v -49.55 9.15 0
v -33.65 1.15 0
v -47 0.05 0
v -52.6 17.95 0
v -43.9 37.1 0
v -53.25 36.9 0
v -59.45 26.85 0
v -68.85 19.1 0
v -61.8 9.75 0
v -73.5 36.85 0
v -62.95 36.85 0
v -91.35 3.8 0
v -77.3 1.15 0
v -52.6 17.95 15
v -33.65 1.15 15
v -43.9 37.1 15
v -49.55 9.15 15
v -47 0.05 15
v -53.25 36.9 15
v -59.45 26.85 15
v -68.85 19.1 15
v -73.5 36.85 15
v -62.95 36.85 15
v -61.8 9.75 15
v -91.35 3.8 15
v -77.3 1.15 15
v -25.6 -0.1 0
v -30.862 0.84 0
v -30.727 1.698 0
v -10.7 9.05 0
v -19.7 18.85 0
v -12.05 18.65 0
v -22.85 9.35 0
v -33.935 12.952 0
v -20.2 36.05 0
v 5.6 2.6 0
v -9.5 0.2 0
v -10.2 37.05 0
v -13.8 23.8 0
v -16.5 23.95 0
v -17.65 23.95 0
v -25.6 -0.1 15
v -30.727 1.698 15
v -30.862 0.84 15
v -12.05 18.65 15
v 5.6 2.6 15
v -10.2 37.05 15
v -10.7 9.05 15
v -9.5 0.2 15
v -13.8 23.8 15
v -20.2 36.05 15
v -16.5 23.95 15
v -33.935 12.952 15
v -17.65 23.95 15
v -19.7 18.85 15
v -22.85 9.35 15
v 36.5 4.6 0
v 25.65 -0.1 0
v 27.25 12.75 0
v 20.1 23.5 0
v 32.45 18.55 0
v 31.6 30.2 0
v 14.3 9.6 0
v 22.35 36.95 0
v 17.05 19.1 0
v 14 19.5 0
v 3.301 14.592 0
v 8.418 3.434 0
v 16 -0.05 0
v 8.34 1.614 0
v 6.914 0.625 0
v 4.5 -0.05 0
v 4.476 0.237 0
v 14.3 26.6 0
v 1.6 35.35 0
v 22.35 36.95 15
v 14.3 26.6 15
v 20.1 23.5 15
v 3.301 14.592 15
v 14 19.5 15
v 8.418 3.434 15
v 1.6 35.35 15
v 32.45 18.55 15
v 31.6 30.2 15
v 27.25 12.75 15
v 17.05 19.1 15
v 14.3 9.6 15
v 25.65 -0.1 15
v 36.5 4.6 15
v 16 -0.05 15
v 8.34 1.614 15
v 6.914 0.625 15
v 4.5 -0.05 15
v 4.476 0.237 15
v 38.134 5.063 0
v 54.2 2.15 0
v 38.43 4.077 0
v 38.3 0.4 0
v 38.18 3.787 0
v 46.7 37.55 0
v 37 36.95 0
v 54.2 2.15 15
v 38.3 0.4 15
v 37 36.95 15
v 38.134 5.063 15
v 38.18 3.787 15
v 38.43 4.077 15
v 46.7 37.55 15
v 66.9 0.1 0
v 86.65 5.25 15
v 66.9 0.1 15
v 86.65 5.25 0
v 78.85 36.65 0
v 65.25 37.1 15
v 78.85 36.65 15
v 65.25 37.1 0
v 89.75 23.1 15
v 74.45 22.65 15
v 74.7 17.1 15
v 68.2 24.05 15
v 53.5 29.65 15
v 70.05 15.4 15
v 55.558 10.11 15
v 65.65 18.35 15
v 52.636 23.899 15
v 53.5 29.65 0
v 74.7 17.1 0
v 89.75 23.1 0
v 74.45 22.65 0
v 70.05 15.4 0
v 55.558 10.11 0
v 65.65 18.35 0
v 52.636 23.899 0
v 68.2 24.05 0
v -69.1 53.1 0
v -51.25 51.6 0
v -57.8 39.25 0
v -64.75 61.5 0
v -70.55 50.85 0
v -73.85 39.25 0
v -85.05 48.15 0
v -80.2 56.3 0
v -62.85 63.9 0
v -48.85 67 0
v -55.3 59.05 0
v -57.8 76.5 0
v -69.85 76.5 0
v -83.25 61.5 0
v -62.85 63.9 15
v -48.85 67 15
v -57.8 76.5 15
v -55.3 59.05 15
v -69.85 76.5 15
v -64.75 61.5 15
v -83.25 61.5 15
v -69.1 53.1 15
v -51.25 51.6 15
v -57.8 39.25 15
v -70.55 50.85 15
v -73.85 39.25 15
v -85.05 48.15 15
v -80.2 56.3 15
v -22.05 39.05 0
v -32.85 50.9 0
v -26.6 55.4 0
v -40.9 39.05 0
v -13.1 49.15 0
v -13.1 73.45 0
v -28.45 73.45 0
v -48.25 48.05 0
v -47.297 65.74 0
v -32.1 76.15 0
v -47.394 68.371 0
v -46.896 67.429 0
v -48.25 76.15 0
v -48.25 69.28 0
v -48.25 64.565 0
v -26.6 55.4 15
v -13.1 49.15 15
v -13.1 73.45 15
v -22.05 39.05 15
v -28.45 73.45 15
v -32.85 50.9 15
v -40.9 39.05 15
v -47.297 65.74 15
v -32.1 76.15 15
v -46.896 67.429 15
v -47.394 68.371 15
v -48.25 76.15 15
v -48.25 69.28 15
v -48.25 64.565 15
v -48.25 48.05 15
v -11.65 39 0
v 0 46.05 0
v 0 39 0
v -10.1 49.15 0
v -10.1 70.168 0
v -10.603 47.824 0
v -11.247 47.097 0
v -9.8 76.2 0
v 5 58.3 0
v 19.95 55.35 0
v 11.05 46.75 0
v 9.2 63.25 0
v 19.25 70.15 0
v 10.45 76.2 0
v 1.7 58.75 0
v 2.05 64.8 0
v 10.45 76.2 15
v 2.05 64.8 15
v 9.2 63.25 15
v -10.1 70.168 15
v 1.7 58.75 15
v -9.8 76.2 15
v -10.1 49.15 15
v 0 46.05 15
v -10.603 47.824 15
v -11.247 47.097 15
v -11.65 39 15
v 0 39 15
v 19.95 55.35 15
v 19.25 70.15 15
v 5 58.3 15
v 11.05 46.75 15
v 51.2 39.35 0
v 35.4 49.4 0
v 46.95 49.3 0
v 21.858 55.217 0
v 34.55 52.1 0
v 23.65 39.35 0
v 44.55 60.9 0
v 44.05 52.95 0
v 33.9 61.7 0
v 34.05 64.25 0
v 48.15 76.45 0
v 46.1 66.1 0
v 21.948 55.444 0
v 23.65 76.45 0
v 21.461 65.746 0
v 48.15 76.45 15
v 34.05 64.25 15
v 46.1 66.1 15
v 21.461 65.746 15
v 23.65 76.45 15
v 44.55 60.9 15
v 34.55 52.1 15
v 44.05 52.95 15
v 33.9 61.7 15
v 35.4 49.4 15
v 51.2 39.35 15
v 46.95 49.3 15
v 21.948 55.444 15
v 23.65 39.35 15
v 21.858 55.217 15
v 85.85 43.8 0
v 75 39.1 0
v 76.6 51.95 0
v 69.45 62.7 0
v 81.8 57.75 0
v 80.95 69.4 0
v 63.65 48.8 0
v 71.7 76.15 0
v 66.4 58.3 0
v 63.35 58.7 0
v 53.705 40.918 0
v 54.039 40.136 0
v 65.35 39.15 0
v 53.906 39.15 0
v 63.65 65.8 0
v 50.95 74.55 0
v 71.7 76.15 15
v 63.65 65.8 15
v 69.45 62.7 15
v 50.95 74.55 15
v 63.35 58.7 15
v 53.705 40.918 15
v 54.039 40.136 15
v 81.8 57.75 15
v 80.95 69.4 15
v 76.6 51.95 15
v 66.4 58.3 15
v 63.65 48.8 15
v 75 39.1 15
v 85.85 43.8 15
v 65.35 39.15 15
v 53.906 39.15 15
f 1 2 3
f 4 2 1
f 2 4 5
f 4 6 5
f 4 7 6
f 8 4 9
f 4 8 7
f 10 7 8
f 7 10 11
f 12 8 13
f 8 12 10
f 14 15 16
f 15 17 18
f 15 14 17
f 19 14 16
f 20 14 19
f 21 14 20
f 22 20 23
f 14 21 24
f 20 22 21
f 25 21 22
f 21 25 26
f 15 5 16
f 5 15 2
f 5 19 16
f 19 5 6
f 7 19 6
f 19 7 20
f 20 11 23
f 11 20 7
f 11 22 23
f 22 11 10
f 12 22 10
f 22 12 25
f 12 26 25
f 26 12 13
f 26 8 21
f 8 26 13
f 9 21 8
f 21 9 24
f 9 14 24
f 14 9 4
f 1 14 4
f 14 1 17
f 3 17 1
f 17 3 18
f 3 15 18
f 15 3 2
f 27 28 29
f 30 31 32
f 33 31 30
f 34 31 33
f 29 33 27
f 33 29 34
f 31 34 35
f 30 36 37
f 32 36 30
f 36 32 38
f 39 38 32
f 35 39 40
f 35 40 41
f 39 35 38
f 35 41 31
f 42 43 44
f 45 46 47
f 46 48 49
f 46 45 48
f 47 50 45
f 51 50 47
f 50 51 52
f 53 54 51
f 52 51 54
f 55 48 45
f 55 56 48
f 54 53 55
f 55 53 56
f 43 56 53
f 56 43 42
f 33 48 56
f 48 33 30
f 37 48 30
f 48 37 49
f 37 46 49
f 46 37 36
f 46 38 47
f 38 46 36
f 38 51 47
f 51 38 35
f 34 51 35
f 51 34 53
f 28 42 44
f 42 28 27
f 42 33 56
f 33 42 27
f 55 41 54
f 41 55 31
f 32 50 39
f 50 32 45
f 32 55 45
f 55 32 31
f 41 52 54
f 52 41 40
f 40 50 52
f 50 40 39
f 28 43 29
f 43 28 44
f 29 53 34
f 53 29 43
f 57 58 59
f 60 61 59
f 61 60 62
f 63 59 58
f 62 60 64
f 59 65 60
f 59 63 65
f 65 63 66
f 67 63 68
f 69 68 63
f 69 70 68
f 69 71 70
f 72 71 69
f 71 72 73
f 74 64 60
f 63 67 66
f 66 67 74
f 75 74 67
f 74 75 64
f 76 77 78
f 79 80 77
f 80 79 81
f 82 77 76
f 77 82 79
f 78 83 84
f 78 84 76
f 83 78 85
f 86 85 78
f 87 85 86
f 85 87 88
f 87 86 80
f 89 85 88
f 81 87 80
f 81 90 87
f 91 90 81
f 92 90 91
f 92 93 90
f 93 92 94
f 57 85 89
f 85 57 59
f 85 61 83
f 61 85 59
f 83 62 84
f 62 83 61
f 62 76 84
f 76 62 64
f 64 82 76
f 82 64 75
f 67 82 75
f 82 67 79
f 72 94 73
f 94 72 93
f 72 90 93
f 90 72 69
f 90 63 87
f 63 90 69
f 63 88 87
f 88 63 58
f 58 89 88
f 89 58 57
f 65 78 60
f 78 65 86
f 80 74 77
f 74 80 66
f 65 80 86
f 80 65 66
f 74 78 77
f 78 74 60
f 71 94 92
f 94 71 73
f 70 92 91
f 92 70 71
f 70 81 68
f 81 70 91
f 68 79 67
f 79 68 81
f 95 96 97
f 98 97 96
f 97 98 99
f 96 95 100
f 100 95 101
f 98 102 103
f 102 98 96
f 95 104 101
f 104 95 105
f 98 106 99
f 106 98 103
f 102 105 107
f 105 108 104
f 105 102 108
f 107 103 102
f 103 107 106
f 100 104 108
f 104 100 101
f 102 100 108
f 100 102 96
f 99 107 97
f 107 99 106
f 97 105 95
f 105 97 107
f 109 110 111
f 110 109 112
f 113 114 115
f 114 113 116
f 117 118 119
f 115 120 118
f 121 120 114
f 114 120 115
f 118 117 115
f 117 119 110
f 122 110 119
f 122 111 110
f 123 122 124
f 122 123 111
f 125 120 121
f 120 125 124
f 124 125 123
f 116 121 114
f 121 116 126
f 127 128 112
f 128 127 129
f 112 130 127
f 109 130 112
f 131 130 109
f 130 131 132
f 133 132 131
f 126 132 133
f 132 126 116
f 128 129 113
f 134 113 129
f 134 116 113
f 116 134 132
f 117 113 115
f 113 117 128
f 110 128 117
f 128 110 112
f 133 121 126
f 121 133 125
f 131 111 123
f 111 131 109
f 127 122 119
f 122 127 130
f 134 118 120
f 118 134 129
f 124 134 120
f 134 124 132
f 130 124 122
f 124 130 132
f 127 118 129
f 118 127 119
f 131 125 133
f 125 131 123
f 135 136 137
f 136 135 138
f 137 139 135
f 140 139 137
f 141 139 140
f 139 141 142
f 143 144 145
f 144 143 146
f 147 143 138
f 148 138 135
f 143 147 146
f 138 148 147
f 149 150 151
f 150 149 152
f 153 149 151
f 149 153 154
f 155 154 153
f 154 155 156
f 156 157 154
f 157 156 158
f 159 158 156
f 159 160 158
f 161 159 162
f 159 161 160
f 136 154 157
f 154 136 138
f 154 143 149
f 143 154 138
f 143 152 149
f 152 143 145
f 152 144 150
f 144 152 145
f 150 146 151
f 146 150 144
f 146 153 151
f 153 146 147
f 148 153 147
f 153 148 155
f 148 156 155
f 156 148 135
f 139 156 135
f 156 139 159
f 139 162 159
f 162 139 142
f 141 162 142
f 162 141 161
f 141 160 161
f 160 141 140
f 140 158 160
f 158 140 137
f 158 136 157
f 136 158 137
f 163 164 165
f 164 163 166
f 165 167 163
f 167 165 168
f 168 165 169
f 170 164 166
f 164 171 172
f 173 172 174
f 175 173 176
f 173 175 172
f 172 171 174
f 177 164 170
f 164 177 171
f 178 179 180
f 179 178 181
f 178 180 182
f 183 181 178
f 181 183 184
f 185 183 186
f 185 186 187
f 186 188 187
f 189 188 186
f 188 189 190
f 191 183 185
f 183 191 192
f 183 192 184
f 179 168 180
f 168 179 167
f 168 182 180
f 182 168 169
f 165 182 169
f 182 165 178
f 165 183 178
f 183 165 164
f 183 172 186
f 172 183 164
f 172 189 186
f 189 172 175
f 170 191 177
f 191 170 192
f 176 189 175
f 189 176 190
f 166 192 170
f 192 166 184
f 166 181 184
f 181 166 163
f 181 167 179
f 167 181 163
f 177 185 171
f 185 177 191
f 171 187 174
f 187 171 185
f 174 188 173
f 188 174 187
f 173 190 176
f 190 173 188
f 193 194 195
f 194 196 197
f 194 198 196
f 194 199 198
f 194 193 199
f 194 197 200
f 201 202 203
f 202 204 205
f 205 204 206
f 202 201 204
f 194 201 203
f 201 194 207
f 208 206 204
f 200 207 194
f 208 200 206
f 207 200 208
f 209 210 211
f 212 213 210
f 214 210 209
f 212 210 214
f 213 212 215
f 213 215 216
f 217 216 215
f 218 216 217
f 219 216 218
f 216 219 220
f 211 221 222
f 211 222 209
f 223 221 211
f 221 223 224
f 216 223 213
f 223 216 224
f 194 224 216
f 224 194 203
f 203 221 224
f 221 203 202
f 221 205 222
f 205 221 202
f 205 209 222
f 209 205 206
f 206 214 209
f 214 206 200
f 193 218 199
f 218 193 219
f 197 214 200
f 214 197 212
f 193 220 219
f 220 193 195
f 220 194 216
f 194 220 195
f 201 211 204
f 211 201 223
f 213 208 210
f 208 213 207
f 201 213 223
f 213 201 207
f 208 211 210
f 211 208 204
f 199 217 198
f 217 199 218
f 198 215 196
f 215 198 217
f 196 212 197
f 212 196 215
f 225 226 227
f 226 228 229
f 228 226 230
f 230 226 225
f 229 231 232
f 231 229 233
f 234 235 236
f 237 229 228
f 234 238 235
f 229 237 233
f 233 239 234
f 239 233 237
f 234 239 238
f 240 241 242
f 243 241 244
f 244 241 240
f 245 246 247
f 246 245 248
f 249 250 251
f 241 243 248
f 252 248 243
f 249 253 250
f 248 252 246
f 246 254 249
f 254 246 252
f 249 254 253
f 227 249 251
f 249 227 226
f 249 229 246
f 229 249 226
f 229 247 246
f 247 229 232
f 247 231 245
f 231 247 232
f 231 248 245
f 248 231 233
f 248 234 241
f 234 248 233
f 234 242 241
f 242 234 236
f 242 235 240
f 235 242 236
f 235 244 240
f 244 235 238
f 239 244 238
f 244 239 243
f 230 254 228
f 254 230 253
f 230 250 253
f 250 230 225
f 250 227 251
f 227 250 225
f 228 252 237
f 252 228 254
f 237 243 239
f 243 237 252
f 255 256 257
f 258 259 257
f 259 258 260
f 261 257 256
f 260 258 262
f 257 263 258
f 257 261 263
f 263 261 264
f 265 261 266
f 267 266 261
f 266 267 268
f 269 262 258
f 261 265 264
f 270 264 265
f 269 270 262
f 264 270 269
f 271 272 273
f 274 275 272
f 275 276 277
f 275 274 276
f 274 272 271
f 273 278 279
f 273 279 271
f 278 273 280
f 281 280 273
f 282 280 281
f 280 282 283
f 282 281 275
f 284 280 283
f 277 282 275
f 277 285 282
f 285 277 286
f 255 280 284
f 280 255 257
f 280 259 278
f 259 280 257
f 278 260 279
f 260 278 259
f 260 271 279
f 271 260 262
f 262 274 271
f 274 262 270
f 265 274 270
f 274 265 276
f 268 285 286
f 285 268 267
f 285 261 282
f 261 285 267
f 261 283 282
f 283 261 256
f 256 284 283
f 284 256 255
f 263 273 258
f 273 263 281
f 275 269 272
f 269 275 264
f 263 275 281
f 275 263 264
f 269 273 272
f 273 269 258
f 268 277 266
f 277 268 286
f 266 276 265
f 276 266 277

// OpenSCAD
// Choose your custom words and write them in UPPERCASE.
// If you want only one line, you can leave the second word empty.
word1="SUPER";
word2="MARIO";

// CONSTANTS
// The following values are model constants and are not intended to be changed by the end user.
//-----------------
// [Fixed design parameters]
// Scale for Word 1
scale_word1 = 5;

// Scale for Word 2
scale_word2 = 5;
// Height scale
scale_height = 15;

// Brim radius/offset
brim_radius = 2;

// Gap between the two words
gap = 2;
// Spaziatura tra le lettere
spacing = 1;


// Small tolerance to help letters fit into the brim
wiggle=0.1;
//-----------------


//-----------------

// Path data for letters and symbols
glyph_A = [
    [449, 741], [765, 52], [463, 4], [439, 181], [196, 187], [141, -2], [-150, 50], [249, 721], [449, 741]
]/100;
glyph_B = [
    [138, 747], [485, 706], [565, 578], [559, 441], [507, 363], [580, 321], [629, 178], [573, 45], [457, 4], [21, 1], [1, 704], [138, 747]
]/100;
glyph_C = [
    [287, 744], [563, 726], [552, 461], [372, 545], [215, 472], [208, 302], [346, 208], [549, 314], [617, 35], [218, 0], [23, 171], [-35, 386], [55, 617], [287, 744]
]/100;
glyph_D = [
    [368, 744], [578, 572], [621, 171], [414, 2], [0, 2], [0, 699], [368, 744]
]/100;
glyph_E = [
    [54, 745], [544, 745], [503, 538], [262, 501], [259, 450], [472, 434], 
    [462, 275], [272, 258], [289, 204], [520, 202], [605, 3], [54, 3], 
    [0, 481], [54, 745]
]/100;
glyph_F = [
    [49, 746], [553, 742], [525, 501], [250, 532], [246, 452], [479, 464], [441, 244], [246, 269], [288, 3], [22, 3], [1, 543], [49, 746]
]/100;
glyph_G = [
    [627, 591], [456, 495], [387, 533], [285, 502], [224, 357], [288, 222], [472, 244], [476, 277], [334, 264], [352, 465], [648, 461], [648, 66], [151, 2], [0, 309], [55, 591], [267, 745], [527, 727], [627, 591]
]/100;
glyph_H = [
    [0, 698], [252, 746], [264, 441], [411, 463], [420, 732], [626, 723], [666, 5], [434, 13], [432, 238], [292, 211], [297, 5], [80, 5],
    [0, 698]
]/100;
glyph_I = [
    [5, 739], [199, 751], [349, 43], [31, 8], [5, 739]
]/100;
glyph_J = [
    [0, 739], [219, 744], [658, 724], [658, 528], [459, 509],
    [533, 162], [430, 32], [235, 0], [18, 0], [25, 220],
    [263, 237], [236, 509], [0, 528], [0, 739]
]/100;
glyph_K = [
    [14, 741], [223, 741], [218, 539], [375, 718], [518, 566],
    [337, 369], [605, 178], [440, 0], [216, 243], [257, -2],
    [0, -2], [14, 741]
]/100;
glyph_L = [
    [278, 717], [249, 269], [556, 306], [584, 75], [28, 9],
    [0, 749], [278, 717]
]/100;
glyph_M = [
    [0, 76], [357, 737], [568, 737], [638, 537], [762, 738],
    [949, 742], [1154, 23], [887, 1], [836, 183], [775, 359],
    [591, 195], [450, 382], [281, 23], [0, 76]
]/100;
glyph_N = [
    [0, 13], [133, 742], [284, 742], [425, 510], [437, 742],
    [669, 706], [620, 4], [428, 16], [280, 242], [237, 3],
    [0, 13]
]/100;
glyph_O = [
    [522, 733], [740, 462], [678, 105], [283, 2], [-32, 280],
    [15, 593], [250, 742], [522, 733]
]/100;
glyph_P = [
    [442, 740], [618, 619], [632, 323], [454, 151], [233, 137], [233, -4], [0, -4], [37, 740], [442, 740]
]/100;
glyph_Q =[
    [531, 731], [721, 478], [653, 216], [797, 84], [621, -2], [535, 61], [238, -3], [-21, 243], [26, 593], [260, 740], [531, 731]
]/100;
glyph_R = [
    [415, 739], [600, 604], [617, 371], [513, 255], [698, 92], [481, -2], [254, 192], [288, -1], [58, -1], [0, 707], [415, 739]
]/100;
glyph_S = [
    [725, 556], [596, 397], [445, 494], [407, 446], [677, 248], [546, 1], [225, 1], [1, 179], [98, 342], [291, 233],
    [320, 278], [37, 446], [305, 746], [546, 746], [725, 556]
]/100;
glyph_T = [
    [0, 742], [739, 729], [739, 429], [489, 470], [558, -1], [200, -1], [254, 470], [0, 483], [0, 742]
]/100;
glyph_U = [
    [-9, 739], [314, 739], [299, 234], [424, 324], [387, 685], [694, 685], [694, 199], [515, -3], [138, -3], [-9, 177], [-9, 739]
]/100;
glyph_V = [
    [0, 745], [259, 731], [362, 284], [401, 334], [512, 731], [799, 745], [517, 3], [169, 29], [0, 745]
]/100;
glyph_W = [
    [1028, 675], [709, 6], [523, 6], [454, 207], [352, 5], [182, 0], [0, 723], [238, 744], [283, 562], [337, 385], [502, 550], [627, 362], [778, 729], [1028, 675]
]/100;
glyph_X = [
    [200, 739], [357, 579], [473, 750], [663, 568], [525, 405], [753, 226], [563, 7], [399, 221], [191, 12], [0, 201], [221, 400], [53, 588], [200, 739]
]/100;
glyph_Y = [
    [71, 733], [236, 557], [391, 753], [610, 588], [371, 380], [548, 13], [156, 31], [156, 350], [-93, 588], [71, 733]
]/100;
glyph_Z = [
    [617, 3], [0, 28], [0, 228], [248, 486], [0, 471], [44, 748], [625, 707], [614, 517], [386, 265], [625, 300], [617, 3]
]/100;
glyph_0 = [
    [381, 732], [552, 531], [497, 90], [224, 1], [3, 223], [48, 606], [202, 742], [381, 732], [560, 732]
]/100;
glyph_1 = [
    [527, 727], [468, 205], [679, 232], [713, 1], [0, 1], [20, 218], [258, 205], [258, 476], [133, 397], [0, 578], [269, 741], [527, 741]
]/100;
glyph_2 = [
    [4, 605], [211, 742], [392, 741], [544, 629], [610, 352], [411, 221], [629, 239], [686, 1], [110, 9], [34, 156], [330, 390], [309, 454], [261, 492], [140, 409], [4, 605]
]/100;
glyph_3 = [
    [1, 607], [178, 740], [403, 708], [511, 522], [441, 421], [528, 357], [534, 131], [415, 1], [148, 26], [1, 175], [120, 291], [220, 197], [314, 222], [317, 279], [170, 329], [176, 419], [295, 498], [264, 531], [97, 454], [1, 607]
]/100;
glyph_4 = [
    [531, 409], [689, 402], [689, 223], [548, 214], [575, 31], [318, 4], [314, 214], [8, 214], [4, 400], [208, 747], [487, 728], [531, 409]
]/100;
glyph_5 = [
    [572, 741], [530, 543], [247, 546], [253, 501], [415, 495], [610, 389], [609, 166], [534, 45], [189, 10], [7, 95], [88, 248], [212, 205], [324, 200], [368, 251], [318, 298], [91, 293], [10, 433], [0, 724], [572, 741]
]/100;
glyph_6 = [
    [154, 719], [335, 746], [515, 709], [447, 499], [286, 559], [211, 500], [202, 444], [416, 438], [501, 300], [499, 120], [380, 1], [136, 1], [0, 120], [0, 371], [28, 575], [154, 719]
]/100;
glyph_7 = [
    [0, 740], [641, 726], [524, -3], [234, 66], [393, 501], [51, 473], [0, 740]
]/100;
glyph_8 = [
    [461, 716], [533, 519], [446, 450], [562, 355], [577, 61], [414, -3], [154, -3], [0, 87], [17, 351], [139, 444], [46, 519], [116, 745], [461, 716]
]/100;
glyph_9 = [
    [306, 747], [533, 593], [524, 320], [447, 127], [116, 1], [0, 161], [264, 230], [319, 327], [137, 313], [0, 463], [36, 677], [306, 747]
]/100;
glyph_at = [
    [422, 103], [606, 184], [657, 125], [441, 2], [160, 63], [3, 349], [116, 715], [381, 854], [786, 684], [869, 344], [800, 248], [744, 167], [636, 182], [594, 233], [461, 169], [234, 206], [183, 482], [323, 672], [510, 664], [596, 607], [599, 637], [670, 600], [653, 418], [677, 260], [722, 243], [783, 364], [710, 615], [385, 748], [197, 637], [119, 371], [212, 165], [422, 103]
]/100;
glyph_b_l = [
    [233, 856], [241, 782], [89, 795], [84, -15], [241, 15], [241, -83], [7, -98], [2, 866], [233, 856]
]/100;
glyph_b_r = [
    [9, -88], [1, -14], [153, -27], [158, 783], [1, 753], [1, 851], [235, 866], [240, -98], [9, -88]
]/100;
glyph_per = [
    [389, 745], [572, 774], [206, 33], [0, 4], [389, 745], [475, 293], [544, 213], [522, 35], [412, 0], [324, 88], [342, 242], [404, 297], [475, 293], [389, 745], [191, 768], [260, 687], [238, 510], [128, 474], [38, 564], [57, 717], [119, 771], [191, 768], [389, 745]
]/100;
glyph_num = [
    [395, 778], [292, 29], [156, 0], [274, 749], [395, 778],
    
    [544, 749], [665, 778], [563, 29], [426, 0], [544, 749], 
    
   [718, 601], [810, 451], [113, 429], [4, 594], [718, 601],  
    
    [733, 328], [832, 169], [135, 147], [60, 316], [733, 328], [718, 601], [544, 749], [395, 778]
]/100;
glyph_dol = [
    [664, 550], [546, 405], [431, 528], [289, 576], [254, 531], [664, 256], [500, 42], [206, 42], [1, 205], [90, 354], [259, 208], [444, 163], [471, 204], [34, 450], [279, 724], [500, 724], 
    [424, 794], [341, 795], [283, -32], [399, -20], [424, 794], [500, 724]
]/100;
glyph_asc = [
    [278, 582], [164, 765], [68, 601], [8, 638], [164, 882], [348, 593], [278, 582]
]/100;
glyph_bar = [
    [60, -121], [5, -121], [3, 853], [58, 853], [60, 974], [115, 974], [60, -121]
]/100;
glyph_ast = [
    [67, 719], [97, 720], [93, 653], [144, 696], [158, 662], [99, 638], [161, 608], [141, 585], [93, 620], [99, 558], [49, 561], [55, 620], [22, 617], [28, 676], [78, 640], [28, 699], [95, 673], [95, 730], [45, 694], [23, 722], [90, 748], [38, 784], [67, 719]
]/100;
glyph_col = [
    [92, 179], [164, 144], [172, 49], [114, 8], [50, 20], [20, 52], [10, 136], [92, 179], [97, 320], [170, 386], [167, 456], [84, 503], [16, 463], [22, 362], [97, 320]
]/100;
//glyph_scol = [
    //[72, 456], [139, 496], [220, 450], [223, 381], [154, 317], [81, 358], [89, 95], [164, 91], [142, -17], [61, -92], [11, -92], [80, 5]
//]/100;
glyph_dot = [
    [107, 173], [186, 173], [233, 91], [200, 30], [107, 9], [64, 82], [107, 173]
]/100;
glyph_sl = [
    [375, 727], [551, 755], [198, 41], [0, 13], [375, 727]
]/100;
glyph_add = [
    [222, 524], [220, 424], [323, 434], [336, 320], [220, 325], [233, 221], [125, 213], [116, 325], [15, 328], [-2, 423], [119, 423], [108, 529], [222, 524]
]/100;
glyph_com = [
    [58, 81], [138, 76], [114, -39], [28, -119], [-25, -119], [48, -15], [58, 81]
]/100;
glyph_dif = [
    [6, 342], [1, 431], [325, 471], [341, 354], [6, 342]
]/100;
glyph_equ = [
    [5, 299], [0, 353], [305, 377], [320, 307], [5, 299], [5, 435], [0, 488], [305, 512], [320, 442], [5, 435]
]/100;
glyph_que = [
    [242, 144], [298, 68], [263, 3], [174, 0], [138, 54], [162, 140], [242, 144],
    [256, 465], [284, 573], [226, 609], [138, 528], [0, 671], [131, 779], [308, 779], [437, 623], [432, 424], [293, 330], [308, 190], [126, 190], [105, 345], [256, 465], [242, 144]
]/100;
glyph_exc = [
    [213, 219], [93, 210], [0, 768], [197, 796], [213, 219],[71, 78], [106, 144], [197, 148], [233, 92], [209, 4], [128, 1], [71, 78]
]/100;
glyph_les = [
    [37, 785], [91, 776], [91, 665], [38, 593], [-3, 609], [38, 691], [205, 776], [205, 665], [152, 593], [99, 609], [140, 691], [139, 785],
    [205, 776], [205, 665], [152, 593], [99, 609], [140, 691], [139, 785]
]/100;
glyph_pr = [
    [0, 785], [71, 785], [175, 658], [251, 402], [240, 130], [200, 2], [80, -100], [33, -80], [120, 41], [150, 268], [119, 498], [0, 785]
]/100;
glyph_pl = [
    [250, 780], [132, 622], [67, 392], [92, 166], [218, -62], [130, -62], [80, 40], [20, 194], [0, 465], [76, 721], [120, 800], [220, 860], [354, 890], [354, 800]
]/100;
glyph_uns = [
    [0, -28], [0, 27], [728, 27], [728, -28], [0, -28]
]/100;
glyph_qus = [
    [37, 785], [91, 776], [91, 665], [38, 593], [-3, 609], [38, 691], [37, 785]
]/100;
// Path data for the holes in the letters and symbols
hole_A = [
    [300, 479], [259, 377], [412, 373], [377, 476], [323, 479]
]/100;
hole_B = [
    [257, 152], [359, 174], [359, 242], [257, 277], [257, 152], [244, 462], [345, 483], [345, 565], [244, 587], [244, 462]
]/100;
hole_D = [
    [229, 477], [229, 259], [364, 306], [364, 415], [229, 477]
]/100;
hole_O = [
    [309, 481], [258, 367], [346, 308], [439, 342], [434, 453], [309, 481]
]/100;
hole_P = [
    [274, 512], [267, 391], [333, 382], [417, 481], [274, 512]
]/100;
hole_Q = [
    [228, 477], [221, 272], [385, 223], [294, 313], [426, 409], [505, 336], [532, 388], [432, 523], [228, 477]
]/100;
hole_R = [
    [254, 532], [248, 390], [309, 382], [370, 470], [254, 532]
]/100;
hole_0 = [
    [257, 488], [235, 324], [279, 287], [327, 321], [318, 462], [257, 462]

]/100;
hole_4 = [
    [216, 409], [305, 409], [297, 513], [216, 409]
]/100;
hole_6 = [
    [258, 267], [211, 244], [213, 185], [292, 185], [308, 249], [258, 267]
]/100;
hole_8 = [
    [364, 259], [306, 283], [248, 259], [248, 211], [306, 187], [364, 211], [364, 259], [332, 587], [288, 605], [244, 587], [244, 551], [288, 533], [332, 551], [332, 587]
]/100;
hole_9 = [
    [225, 480], [312, 480], [321, 527], [281, 560], [225, 527], [225, 480]
]/100;
hole_at = [
    [381, 514], [336, 445], [365, 351], [451, 351], [508, 418], [479, 504], [381, 514]
]/100;
hole_per = [
    [426, 195], [417, 129], [435, 114], [454, 128], [451, 185], [426, 195],
    [141, 670], [132, 604], [149, 589], [169, 603], [165, 659], [141, 670]
]/100;
// Width of the letters
width = [765-100/*A*/, 629-1/*B*/, 617+35/*C*/, 621-0/*D*/, 605-25/*E*/, 553-1/*F*/, 648-0/*G*/, 666-0/*H*/, 350-50/*I*/, 658-0/*J*/, 540-0/*K*/, 584-0/*L*/, 1154-0/*M*/, 669-0/*N*/, 740+32/*O*/, 632-0/*P*/, 797+21/*Q*/, 698-15/*R*/, 725+1/*S*/, 739-0/*T*/, 694+9/*U*/, 799-0/*V*/, 1028-0/*W*/, 753-0/*X*/, 610+93/*Y*/, 625-0/*Z*/, 560-3/*0*/, 620/*1*/, 686-4/*2*/, 600/*3*/, 689-4/*4*/, 680/*5*/, 515/*6*/, 641/*7*/, 577/*8*/, 533/*9*/, 869/*@*/, 240/*[*/, 240/*]*/, 572/*%*/, 572/*#*/, 664/*$*/, 348/*^*/, 115/*|*/, 161/***/, 172+79/*:*/, 220/*;*/, 270/*.*/, 551/*/*/, 336/*+*/, 160/*,*/, 330/*-*/, 310/*=*/, 430/*?*/, 230/*!*/, 882/*<*/, 251/*)*/, 354/*(*/, 728/*_*/, 90/*'*/]/100;
width_A = width[0];
width_B = width[1];
width_C = width[2];
width_D = width[3];
width_E = width[4];
width_F = width[5];
width_G = width[6];
width_H = width[7];
width_I = width[8];
width_J = width[9];
width_K = width[10];
width_L = width[11];
width_M = width[12];
width_N = width[13];
width_O = width[14];
width_P = width[15];
width_Q = width[16];
width_R = width[17];
width_S = width[18];
width_T = width[19];
width_U = width[20];
width_V = width[21];
width_W = width[22];
width_X = width[23];
width_Y = width[24];
width_Z = width[25];
width_0 = width[26];
width_1 = width[27];
width_2 = width[28];
width_3 = width[29];
width_4 = width[30];
width_5 = width[31];
width_6 = width[32];
width_7 = width[33];
width_8 = width[34];
width_9 = width[35];
width_at = width[36];
width_b_l = width[37];
width_b_r = width[38];
width_per = width[39];
width_num = width[40];
width_dol = width[41];
width_asc = width[42];
width_bar = width[43];
width_ast = width[44];
width_col = width[45];
width_scol = width[46];
width_dot = width[47];
width_sl = width[48];
width_add = width[49];
width_com = width[50];
width_dif = width[51];
width_equ = width[52];
width_que = width[53];
width_exc = width[54];
width_les = width[55];
width_pr = width[56];
width_pl = width[57];
width_uns = width[58];
width_qus = width[59];
// Function that returns the path data for any supported letter or symbol
function glyph_sorter_all(letter) =
    letter == "A" ? (glyph_A) :
    letter == "B" ? (glyph_B) :
    letter == "C" ? (glyph_C) :
    letter == "D" ? (glyph_D) :
    letter == "E" ? (glyph_E) :
    letter == "F" ? (glyph_F) :
    letter == "G" ? (glyph_G) :
    letter == "H" ? (glyph_H) :
    letter == "I" ? (glyph_I) :
    letter == "J" ? (glyph_J) :
    letter == "K" ? (glyph_K) :
    letter == "L" ? (glyph_L) :
    letter == "M" ? (glyph_M) :
    letter == "N" ? (glyph_N) :
    letter == "O" ? (glyph_O) :
    letter == "P" ? (glyph_P) :
    letter == "Q" ? (glyph_Q) :
    letter == "R" ? (glyph_R) :
    letter == "S" ? (glyph_S) :
    letter == "T" ? (glyph_T) :
    letter == "U" ? (glyph_U) :
    letter == "V" ? (glyph_V) :
    letter == "W" ? (glyph_W) :
    letter == "X" ? (glyph_X) :
    letter == "Y" ? (glyph_Y) :
    letter == "Z" ? (glyph_Z) :
    letter == "0" ? (glyph_0) :
    letter == "1" ? (glyph_1) :
    letter == "2" ? (glyph_2) :
    letter == "3" ? (glyph_3) :
    letter == "4" ? (glyph_4) :
    letter == "5" ? (glyph_5) :
    letter == "6" ? (glyph_6) :
    letter == "7" ? (glyph_7) :
    letter == "8" ? (glyph_8) :
    letter == "9" ? (glyph_9) :
    letter == "@" ? (glyph_at) :
    letter == "[" ? (glyph_b_l) :
    letter == "]" ? (glyph_b_r) :
    letter == "%" ? (glyph_per) :
    letter == "#" ? (glyph_num) :
    letter == "$" ? (glyph_dol) :
    letter == "^" ? (glyph_asc) :
    letter == "|" ? (glyph_bar) :
    letter == "*" ? (glyph_ast) :
    letter == ":" ? (glyph_col) :
    letter == ";" ? (glyph_scol) :
    letter == "." ? (glyph_dot) :
    letter == "/" ? (glyph_sl) :
    letter == "+" ? (glyph_add) :
    letter == "," ? (glyph_com) :
    letter == "-" ? (glyph_dif) :
    letter == "=" ? (glyph_equ) :
    letter == "?" ? (glyph_que) :
    letter == "!" ? (glyph_exc) :
    letter == "<" ? (glyph_les) :
    letter == ")" ? (glyph_pr) :
    letter == "(" ? (glyph_pl) :
    letter == "_" ? (glyph_uns) :
    letter == "'" ? (glyph_qus) :
    0; // Default value for unsupported letters

// Function that returns the path data for a subset of letters/symbols (used for solid letters)
function glyph_sorter(letter) =
    letter == "C" ? (glyph_C) :
    letter == "E" ? (glyph_E) :
    letter == "F" ? (glyph_F) :
    letter == "G" ? (glyph_G) :
    letter == "H" ? (glyph_H) :
    letter == "I" ? (glyph_I) :
    letter == "J" ? (glyph_J) :
    letter == "K" ? (glyph_K) :
    letter == "L" ? (glyph_L) :
    letter == "M" ? (glyph_M) :
    letter == "N" ? (glyph_N) :
    letter == "S" ? (glyph_S) :
    letter == "T" ? (glyph_T) :
    letter == "U" ? (glyph_U) :
    letter == "V" ? (glyph_V) :
    letter == "W" ? (glyph_W) :
    letter == "X" ? (glyph_X) :
    letter == "Y" ? (glyph_Y) :
    letter == "Z" ? (glyph_Z) :
    letter == "1" ? (glyph_1) :
    letter == "2" ? (glyph_2) :
    letter == "3" ? (glyph_3) :
    letter == "5" ? (glyph_5) :
    letter == "7" ? (glyph_7) :
    letter == "[" ? (glyph_b_l) :
    letter == "]" ? (glyph_b_r) :
    letter == "#" ? (glyph_num) :
    letter == "$" ? (glyph_dol) :
    letter == "^" ? (glyph_asc) :
    letter == "|" ? (glyph_bar) :
    letter == "*" ? (glyph_ast) :
    letter == ":" ? (glyph_col) :
    letter == ";" ? (glyph_scol) :
    letter == "." ? (glyph_dot) :
    letter == "/" ? (glyph_sl) :
    letter == "+" ? (glyph_add) :
    letter == "," ? (glyph_com) :
    letter == "-" ? (glyph_dif) :
    letter == "=" ? (glyph_equ) :
    letter == "?" ? (glyph_que) :
    letter == "!" ? (glyph_exc) :
    letter == "<" ? (glyph_les) :
    letter == ")" ? (glyph_pr) :
    letter == "(" ? (glyph_pl) :
    letter == "_" ? (glyph_uns) :
    letter == "'" ? (glyph_qus) :
    0; // Default value for unsupported letters

// Function that returns the path data for letters with holes (used for hollow or outlined letters
function glyph_sorter_hole(letter) =
    letter == "A" ? (glyph_A) :
    letter == "B" ? (glyph_B) :
    letter == "D" ? (glyph_D) :
    letter == "O" ? (glyph_O) :
    letter == "P" ? (glyph_P) :
    letter == "Q" ? (glyph_Q) :
    letter == "R" ? (glyph_R) :
    letter == "0" ? (glyph_0) :
    letter == "4" ? (glyph_4) :
    letter == "6" ? (glyph_6) :
    letter == "8" ? (glyph_8) :
    letter == "9" ? (glyph_9) :
    letter == "@" ? (glyph_at) :
    letter == "%" ? (glyph_per) :
    0; // Default value for unsupported letters

// Function that returns the path data for the hole inside a letter (if present)
function hole_sorter(letter) =
    letter == "A" ? (hole_A) :
    letter == "B" ? (hole_B) :
    letter == "D" ? (hole_D) :
    letter == "O" ? (hole_O) :
    letter == "P" ? (hole_P) :
    letter == "Q" ? (hole_Q) :
    letter == "R" ? (hole_R) :
    letter == "0" ? (hole_0) :
    letter == "4" ? (hole_4) :
    letter == "6" ? (hole_6) :
    letter == "8" ? (hole_8) :
    letter == "9" ? (hole_9) :
    letter == "@" ? (hole_at) :
    letter == "%" ? (hole_per) :
    0;  // Default value for unsupported letters

// Function that returns the width of a letter or symbol, used for spacing
function width_letter(letter) =
    letter == "A" ? (width_A) :
    letter == "B" ? (width_B) :
    letter == "C" ? (width_C) :
    letter == "D" ? (width_D) :
    letter == "E" ? (width_E) :
    letter == "F" ? (width_F) :
    letter == "G" ? (width_G) :
    letter == "H" ? (width_H) :
    letter == "I" ? (width_I) :
    letter == "J" ? (width_J) :
    letter == "K" ? (width_K) :
    letter == "L" ? (width_L) :
    letter == "M" ? (width_M) :
    letter == "N" ? (width_N) :
    letter == "O" ? (width_O) :
    letter == "P" ? (width_P) :
    letter == "Q" ? (width_Q) :
    letter == "R" ? (width_R) :
    letter == "S" ? (width_S) :
    letter == "T" ? (width_T) :
    letter == "U" ? (width_U) :
    letter == "V" ? (width_V) :
    letter == "W" ? (width_W) :
    letter == "X" ? (width_X) :
    letter == "Y" ? (width_Y) :
    letter == "Z" ? (width_Z) :
    letter == "0" ? (width_0) :
    letter == "1" ? (width_1) :
    letter == "2" ? (width_2) :
    letter == "3" ? (width_3) :
    letter == "4" ? (width_4) :
    letter == "5" ? (width_5) :
    letter == "6" ? (width_6) :
    letter == "7" ? (width_7) :
    letter == "8" ? (width_8) :
    letter == "9" ? (width_9) :
    letter == "@" ? (width_at) :
    letter == "[" ? (width_b_l) :
    letter == "]" ? (width_b_r) :
    letter == "%" ? (width_per) :
    letter == "#" ? (width_num) :
    letter == "$" ? (width_dol) :
    letter == "^" ? (width_asc) :
    letter == "|" ? (width_bar) :
    letter == "*" ? (width_ast) :
    letter == ":" ? (width_col) :
    letter == ";" ? (width_scol) :
    letter == "." ? (width_dot) :
    letter == "/" ? (width_sl) :
    letter == "+" ? (width_add) :
    letter == "," ? (width_com) :
    letter == "-" ? (width_dif) :
    letter == "=" ? (width_equ) :
    letter == "?" ? (width_que) :
    letter == "!" ? (width_exc) :
    letter == "<" ? (width_les) :
    letter == ")" ? (glyph_pr) :
    letter == "(" ? (glyph_pl) :
    letter == "_" ? (glyph_uns) :
    letter == "'" ? (glyph_qus) :
    0; // Default value for unsupported letters

// Module that draws a glyph as a 2D polygon and extrudes it to the given height
module draw_glyph(paths, height=1)
{
    linear_extrude(height)
    polygon(paths); 
 

}

// Module that draws a glyph with a negative offset for hollow letters
module draw_glyph_smaller(paths, height=1)
{
    linear_extrude(height) offset(-wall_thikness_letter)
    polygon(paths);
}
// These Moduls are used to draw the brim around the letters, interlocking
// Module that draws the brim (outline) of a glyph with brim_radius
module draw_glyph_brim(paths, height=1)
{
     linear_extrude(height) offset(brim_radius) polygon(paths); // Dickerer Umriss am unteren Ende
}
// Module that draws a larger brim for hollow letters
module draw_glyph_brim_bigger(paths, height=1)
{
     linear_extrude(height) offset(brim_radius + wall_thikness_letter) polygon(paths); // Dickerer Umriss am unteren Ende
}

// Module that renders both words, positioning them correctly
module call_words(brim, k)
{   // Render the second word, centered horizontally
    translate([-total_width(word2, scale_word2) / 2, 0, 0])
    {
        render_word(word2, scale_height, scale_word2, k, brim);
    }
    // Render the first word, centered horizontally and shifted vertically
    translate([-total_width(word1, scale_word1) / 2, 7.44 * scale_word2 + gap, 0])
    {
        render_word(word1, scale_height, scale_word1, k, brim);
    }
}

// Module is necessary to renderer the letters to interlock them
// Module that renders a single letter with all options (brim, hollow, holes, etc.)
module render_letter(letter, height, i, pre_letter, scale, k, brim)
{
        // If the letter has a hole (A, B, D, O, P, Q, R, 0, 4, 6, 8, 9, @, %), draw the brim and the hole

        if(letter == "A"||"B"||"D"||"O"||"P"||"Q"||"R"||"0"||"4"||"6"||"8"||"9"||"@"||"%")
    {
        draw_glyph_brim(glyph_sorter_hole(letter)*scale, brim);
        difference()
        {
            draw_glyph(glyph_sorter_hole(letter)*scale, height);
            translate([0, 0, -1]) draw_glyph(hole_sorter(letter)*scale, height + 2);// Loch
            translate([-width_letter(pre_letter)*scale, 0, 0])draw_glyph_brim(glyph_sorter_all(pre_letter)*scale, height+2);
        }
    }
    // Draw the brim and the letter for all other cases

    draw_glyph_brim(glyph_sorter(letter)*scale,brim);
    difference()
    {
        draw_glyph(glyph_sorter(letter)*scale, height);
        translate([-width_letter(pre_letter)*scale-spacing, 0, 0])draw_glyph_brim(glyph_sorter_all(pre_letter)*scale, height+2);
    }

}



// Module that renders a word, letter by letter, with correct spacing
module render_word(word, height=1, scale, k, brim)
{ 
    // Loop through each letter in the word and render it with the correct spacing

    for (i = [0 : len(word) - 1])
    {
        translate([spacing_letter(i, str(word[i]), word, scale), 0, 0])
        {
            render_letter(str(word[i]), height, i, i == 0 ? "" : str(word[i-1]), scale, k, brim);
        }
    }
}

// Function that calculates the X offset for each letter in a word

function spacing_letter(i, letter, word, scale)
= i == 0 ? 0 : spacing_letter(i-1, str(word[i-1]), word, scale) + width_letter(str(word[i-1])) * scale + spacing;

// Function that calculates the total width of a word
function total_width(word, scale) = spacing_letter(len(word)-1, str(word[len(word)-1]), word, scale) + width_letter(str(word[len(word)-1])) * scale;

// Main module to render both words
module letters_main() 
{
    // Call the words with the specified parameters
    call_words(0, false);

}

letters_main();
